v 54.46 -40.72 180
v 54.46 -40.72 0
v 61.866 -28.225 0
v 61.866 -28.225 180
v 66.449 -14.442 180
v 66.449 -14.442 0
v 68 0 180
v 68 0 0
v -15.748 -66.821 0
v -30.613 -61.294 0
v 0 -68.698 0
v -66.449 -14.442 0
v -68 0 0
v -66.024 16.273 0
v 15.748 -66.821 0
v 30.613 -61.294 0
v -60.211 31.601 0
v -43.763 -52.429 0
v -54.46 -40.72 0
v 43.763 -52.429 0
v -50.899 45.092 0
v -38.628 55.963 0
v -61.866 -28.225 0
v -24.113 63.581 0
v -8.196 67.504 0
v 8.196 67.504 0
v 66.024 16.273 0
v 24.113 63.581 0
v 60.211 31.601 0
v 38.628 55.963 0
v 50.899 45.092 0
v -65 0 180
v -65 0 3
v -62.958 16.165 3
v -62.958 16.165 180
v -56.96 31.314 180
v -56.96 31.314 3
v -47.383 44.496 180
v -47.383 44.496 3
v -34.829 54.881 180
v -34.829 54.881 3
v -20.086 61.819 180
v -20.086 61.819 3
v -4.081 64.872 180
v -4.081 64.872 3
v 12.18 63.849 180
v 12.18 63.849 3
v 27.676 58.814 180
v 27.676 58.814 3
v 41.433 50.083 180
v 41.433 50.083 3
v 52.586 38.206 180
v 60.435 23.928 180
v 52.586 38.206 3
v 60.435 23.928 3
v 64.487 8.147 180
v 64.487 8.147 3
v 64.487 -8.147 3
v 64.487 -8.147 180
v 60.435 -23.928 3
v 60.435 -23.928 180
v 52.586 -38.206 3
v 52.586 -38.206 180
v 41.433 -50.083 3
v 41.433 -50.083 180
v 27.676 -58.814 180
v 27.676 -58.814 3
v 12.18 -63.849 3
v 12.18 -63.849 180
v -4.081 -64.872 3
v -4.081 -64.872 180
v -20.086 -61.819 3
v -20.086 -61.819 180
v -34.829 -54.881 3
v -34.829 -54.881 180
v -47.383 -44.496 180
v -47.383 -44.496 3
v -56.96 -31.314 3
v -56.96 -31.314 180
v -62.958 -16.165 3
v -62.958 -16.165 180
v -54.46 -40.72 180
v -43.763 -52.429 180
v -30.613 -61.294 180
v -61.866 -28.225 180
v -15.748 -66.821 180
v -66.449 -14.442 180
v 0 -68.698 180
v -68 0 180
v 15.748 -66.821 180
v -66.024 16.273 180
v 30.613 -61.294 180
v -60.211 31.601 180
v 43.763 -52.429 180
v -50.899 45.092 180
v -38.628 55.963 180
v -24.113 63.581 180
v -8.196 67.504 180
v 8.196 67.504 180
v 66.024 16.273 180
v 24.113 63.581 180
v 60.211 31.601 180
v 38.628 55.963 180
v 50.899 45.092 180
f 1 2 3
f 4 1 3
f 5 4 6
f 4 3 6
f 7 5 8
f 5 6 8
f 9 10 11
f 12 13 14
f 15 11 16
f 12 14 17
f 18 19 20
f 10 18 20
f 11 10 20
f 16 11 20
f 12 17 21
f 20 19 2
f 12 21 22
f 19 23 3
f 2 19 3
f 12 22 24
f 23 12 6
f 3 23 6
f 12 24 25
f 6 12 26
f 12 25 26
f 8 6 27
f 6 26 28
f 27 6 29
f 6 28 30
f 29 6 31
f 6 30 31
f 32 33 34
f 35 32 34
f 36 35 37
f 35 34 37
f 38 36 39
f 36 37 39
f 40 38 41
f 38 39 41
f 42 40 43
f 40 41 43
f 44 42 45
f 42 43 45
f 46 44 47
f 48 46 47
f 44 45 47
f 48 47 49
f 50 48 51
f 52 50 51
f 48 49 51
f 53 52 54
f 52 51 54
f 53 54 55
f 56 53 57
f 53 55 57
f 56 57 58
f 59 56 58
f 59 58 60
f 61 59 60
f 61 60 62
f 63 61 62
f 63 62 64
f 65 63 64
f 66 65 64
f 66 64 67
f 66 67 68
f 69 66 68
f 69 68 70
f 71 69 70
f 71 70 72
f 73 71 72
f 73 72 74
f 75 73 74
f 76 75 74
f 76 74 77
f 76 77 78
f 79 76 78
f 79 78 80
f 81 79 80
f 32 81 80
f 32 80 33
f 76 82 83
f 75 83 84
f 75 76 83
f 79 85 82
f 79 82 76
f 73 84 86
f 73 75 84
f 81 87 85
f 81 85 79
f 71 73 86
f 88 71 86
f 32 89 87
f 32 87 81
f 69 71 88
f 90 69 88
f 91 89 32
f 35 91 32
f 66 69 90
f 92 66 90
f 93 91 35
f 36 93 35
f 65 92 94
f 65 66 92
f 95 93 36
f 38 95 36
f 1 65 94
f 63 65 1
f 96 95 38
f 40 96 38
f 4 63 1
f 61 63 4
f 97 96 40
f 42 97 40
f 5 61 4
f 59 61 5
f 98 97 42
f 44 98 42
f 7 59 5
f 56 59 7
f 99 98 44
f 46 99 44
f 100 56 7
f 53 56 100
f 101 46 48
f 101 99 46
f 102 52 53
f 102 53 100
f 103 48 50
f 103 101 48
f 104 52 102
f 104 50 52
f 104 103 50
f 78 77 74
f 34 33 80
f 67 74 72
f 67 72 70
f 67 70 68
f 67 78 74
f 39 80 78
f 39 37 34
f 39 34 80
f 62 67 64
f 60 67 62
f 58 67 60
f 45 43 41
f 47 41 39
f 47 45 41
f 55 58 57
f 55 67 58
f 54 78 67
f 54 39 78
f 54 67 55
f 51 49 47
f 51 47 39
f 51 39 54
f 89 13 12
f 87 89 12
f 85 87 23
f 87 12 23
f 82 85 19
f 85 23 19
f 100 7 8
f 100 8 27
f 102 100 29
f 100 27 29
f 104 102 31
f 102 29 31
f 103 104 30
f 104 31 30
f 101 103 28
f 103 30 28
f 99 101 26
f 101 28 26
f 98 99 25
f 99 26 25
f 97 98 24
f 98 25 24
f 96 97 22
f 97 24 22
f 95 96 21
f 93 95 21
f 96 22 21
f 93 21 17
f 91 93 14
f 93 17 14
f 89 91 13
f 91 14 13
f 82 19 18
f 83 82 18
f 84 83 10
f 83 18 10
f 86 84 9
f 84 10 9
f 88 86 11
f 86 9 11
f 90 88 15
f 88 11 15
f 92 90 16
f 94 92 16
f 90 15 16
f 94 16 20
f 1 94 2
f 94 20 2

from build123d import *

# Parameters (mm, degrees)
F1_DEPTH = 180
F2_DEPTH = 3


with BuildPart() as f1:
    # F0 (on Top) → F1 (new body)
    with BuildSketch(Plane.XY):
        with BuildLine():
            ThreePointArc((-54.459718, -40.720255), (-64.038422, -21.381102), (-66.971492, 0))
            Line((-66.971492, 0), (-68, 0))
            ThreePointArc((-68, 0), (-64.526199, -21.456225), (-54.459718, -40.720255))
        make_face()
        with BuildLine():
            Line((-68, 0), (-66.971492, 0))
            ThreePointArc((-66.971492, 0), (0.852343, 65.28321), (66.99318, -1.704548))
            ThreePointArc((66.99318, -1.704548), (63.782897, -22.194259), (54.459718, -40.720255))
            ThreePointArc((54.459718, -40.720255), (64.526199, -21.456225), (68, 0))
            ThreePointArc((68, 0), (0, 68), (-68, 0))
        make_face()
        with BuildLine():
            ThreePointArc((65, 0), (0, 65), (-65, 0))
            ThreePointArc((-65, 0), (0, -65), (65, 0))
        make_face()
        with BuildLine():
            ThreePointArc((54.459718, -40.720255), (0, -68), (-54.459718, -40.720255))
            ThreePointArc((-54.459718, -40.720255), (0, -68.697729), (54.459718, -40.720255))
        make_face()
        with BuildLine():
            ThreePointArc((66.99318, -1.704548), (0.852343, 65.28321), (-66.971492, 0))
            ThreePointArc((-66.971492, 0), (-64.038422, -21.381102), (-54.459718, -40.720255))
            ThreePointArc((-54.459718, -40.720255), (0, -68), (54.459718, -40.720255))
            ThreePointArc((54.459718, -40.720255), (63.782897, -22.194259), (66.99318, -1.704548))
        make_face()
        with BuildLine():
            ThreePointArc((65, 0), (0, -65), (-65, 0))
            ThreePointArc((-65, 0), (0, 65), (65, 0))
        make_face(mode=Mode.SUBTRACT)
    extrude(amount=F1_DEPTH)

    # F0 (on Top) → F2 (join)
    with BuildSketch(Plane.XY):
        with BuildLine():
            ThreePointArc((65, 0), (0, 65), (-65, 0))
            ThreePointArc((-65, 0), (0, -65), (65, 0))
        make_face()
    extrude(amount=F2_DEPTH)


solid = f1.part
